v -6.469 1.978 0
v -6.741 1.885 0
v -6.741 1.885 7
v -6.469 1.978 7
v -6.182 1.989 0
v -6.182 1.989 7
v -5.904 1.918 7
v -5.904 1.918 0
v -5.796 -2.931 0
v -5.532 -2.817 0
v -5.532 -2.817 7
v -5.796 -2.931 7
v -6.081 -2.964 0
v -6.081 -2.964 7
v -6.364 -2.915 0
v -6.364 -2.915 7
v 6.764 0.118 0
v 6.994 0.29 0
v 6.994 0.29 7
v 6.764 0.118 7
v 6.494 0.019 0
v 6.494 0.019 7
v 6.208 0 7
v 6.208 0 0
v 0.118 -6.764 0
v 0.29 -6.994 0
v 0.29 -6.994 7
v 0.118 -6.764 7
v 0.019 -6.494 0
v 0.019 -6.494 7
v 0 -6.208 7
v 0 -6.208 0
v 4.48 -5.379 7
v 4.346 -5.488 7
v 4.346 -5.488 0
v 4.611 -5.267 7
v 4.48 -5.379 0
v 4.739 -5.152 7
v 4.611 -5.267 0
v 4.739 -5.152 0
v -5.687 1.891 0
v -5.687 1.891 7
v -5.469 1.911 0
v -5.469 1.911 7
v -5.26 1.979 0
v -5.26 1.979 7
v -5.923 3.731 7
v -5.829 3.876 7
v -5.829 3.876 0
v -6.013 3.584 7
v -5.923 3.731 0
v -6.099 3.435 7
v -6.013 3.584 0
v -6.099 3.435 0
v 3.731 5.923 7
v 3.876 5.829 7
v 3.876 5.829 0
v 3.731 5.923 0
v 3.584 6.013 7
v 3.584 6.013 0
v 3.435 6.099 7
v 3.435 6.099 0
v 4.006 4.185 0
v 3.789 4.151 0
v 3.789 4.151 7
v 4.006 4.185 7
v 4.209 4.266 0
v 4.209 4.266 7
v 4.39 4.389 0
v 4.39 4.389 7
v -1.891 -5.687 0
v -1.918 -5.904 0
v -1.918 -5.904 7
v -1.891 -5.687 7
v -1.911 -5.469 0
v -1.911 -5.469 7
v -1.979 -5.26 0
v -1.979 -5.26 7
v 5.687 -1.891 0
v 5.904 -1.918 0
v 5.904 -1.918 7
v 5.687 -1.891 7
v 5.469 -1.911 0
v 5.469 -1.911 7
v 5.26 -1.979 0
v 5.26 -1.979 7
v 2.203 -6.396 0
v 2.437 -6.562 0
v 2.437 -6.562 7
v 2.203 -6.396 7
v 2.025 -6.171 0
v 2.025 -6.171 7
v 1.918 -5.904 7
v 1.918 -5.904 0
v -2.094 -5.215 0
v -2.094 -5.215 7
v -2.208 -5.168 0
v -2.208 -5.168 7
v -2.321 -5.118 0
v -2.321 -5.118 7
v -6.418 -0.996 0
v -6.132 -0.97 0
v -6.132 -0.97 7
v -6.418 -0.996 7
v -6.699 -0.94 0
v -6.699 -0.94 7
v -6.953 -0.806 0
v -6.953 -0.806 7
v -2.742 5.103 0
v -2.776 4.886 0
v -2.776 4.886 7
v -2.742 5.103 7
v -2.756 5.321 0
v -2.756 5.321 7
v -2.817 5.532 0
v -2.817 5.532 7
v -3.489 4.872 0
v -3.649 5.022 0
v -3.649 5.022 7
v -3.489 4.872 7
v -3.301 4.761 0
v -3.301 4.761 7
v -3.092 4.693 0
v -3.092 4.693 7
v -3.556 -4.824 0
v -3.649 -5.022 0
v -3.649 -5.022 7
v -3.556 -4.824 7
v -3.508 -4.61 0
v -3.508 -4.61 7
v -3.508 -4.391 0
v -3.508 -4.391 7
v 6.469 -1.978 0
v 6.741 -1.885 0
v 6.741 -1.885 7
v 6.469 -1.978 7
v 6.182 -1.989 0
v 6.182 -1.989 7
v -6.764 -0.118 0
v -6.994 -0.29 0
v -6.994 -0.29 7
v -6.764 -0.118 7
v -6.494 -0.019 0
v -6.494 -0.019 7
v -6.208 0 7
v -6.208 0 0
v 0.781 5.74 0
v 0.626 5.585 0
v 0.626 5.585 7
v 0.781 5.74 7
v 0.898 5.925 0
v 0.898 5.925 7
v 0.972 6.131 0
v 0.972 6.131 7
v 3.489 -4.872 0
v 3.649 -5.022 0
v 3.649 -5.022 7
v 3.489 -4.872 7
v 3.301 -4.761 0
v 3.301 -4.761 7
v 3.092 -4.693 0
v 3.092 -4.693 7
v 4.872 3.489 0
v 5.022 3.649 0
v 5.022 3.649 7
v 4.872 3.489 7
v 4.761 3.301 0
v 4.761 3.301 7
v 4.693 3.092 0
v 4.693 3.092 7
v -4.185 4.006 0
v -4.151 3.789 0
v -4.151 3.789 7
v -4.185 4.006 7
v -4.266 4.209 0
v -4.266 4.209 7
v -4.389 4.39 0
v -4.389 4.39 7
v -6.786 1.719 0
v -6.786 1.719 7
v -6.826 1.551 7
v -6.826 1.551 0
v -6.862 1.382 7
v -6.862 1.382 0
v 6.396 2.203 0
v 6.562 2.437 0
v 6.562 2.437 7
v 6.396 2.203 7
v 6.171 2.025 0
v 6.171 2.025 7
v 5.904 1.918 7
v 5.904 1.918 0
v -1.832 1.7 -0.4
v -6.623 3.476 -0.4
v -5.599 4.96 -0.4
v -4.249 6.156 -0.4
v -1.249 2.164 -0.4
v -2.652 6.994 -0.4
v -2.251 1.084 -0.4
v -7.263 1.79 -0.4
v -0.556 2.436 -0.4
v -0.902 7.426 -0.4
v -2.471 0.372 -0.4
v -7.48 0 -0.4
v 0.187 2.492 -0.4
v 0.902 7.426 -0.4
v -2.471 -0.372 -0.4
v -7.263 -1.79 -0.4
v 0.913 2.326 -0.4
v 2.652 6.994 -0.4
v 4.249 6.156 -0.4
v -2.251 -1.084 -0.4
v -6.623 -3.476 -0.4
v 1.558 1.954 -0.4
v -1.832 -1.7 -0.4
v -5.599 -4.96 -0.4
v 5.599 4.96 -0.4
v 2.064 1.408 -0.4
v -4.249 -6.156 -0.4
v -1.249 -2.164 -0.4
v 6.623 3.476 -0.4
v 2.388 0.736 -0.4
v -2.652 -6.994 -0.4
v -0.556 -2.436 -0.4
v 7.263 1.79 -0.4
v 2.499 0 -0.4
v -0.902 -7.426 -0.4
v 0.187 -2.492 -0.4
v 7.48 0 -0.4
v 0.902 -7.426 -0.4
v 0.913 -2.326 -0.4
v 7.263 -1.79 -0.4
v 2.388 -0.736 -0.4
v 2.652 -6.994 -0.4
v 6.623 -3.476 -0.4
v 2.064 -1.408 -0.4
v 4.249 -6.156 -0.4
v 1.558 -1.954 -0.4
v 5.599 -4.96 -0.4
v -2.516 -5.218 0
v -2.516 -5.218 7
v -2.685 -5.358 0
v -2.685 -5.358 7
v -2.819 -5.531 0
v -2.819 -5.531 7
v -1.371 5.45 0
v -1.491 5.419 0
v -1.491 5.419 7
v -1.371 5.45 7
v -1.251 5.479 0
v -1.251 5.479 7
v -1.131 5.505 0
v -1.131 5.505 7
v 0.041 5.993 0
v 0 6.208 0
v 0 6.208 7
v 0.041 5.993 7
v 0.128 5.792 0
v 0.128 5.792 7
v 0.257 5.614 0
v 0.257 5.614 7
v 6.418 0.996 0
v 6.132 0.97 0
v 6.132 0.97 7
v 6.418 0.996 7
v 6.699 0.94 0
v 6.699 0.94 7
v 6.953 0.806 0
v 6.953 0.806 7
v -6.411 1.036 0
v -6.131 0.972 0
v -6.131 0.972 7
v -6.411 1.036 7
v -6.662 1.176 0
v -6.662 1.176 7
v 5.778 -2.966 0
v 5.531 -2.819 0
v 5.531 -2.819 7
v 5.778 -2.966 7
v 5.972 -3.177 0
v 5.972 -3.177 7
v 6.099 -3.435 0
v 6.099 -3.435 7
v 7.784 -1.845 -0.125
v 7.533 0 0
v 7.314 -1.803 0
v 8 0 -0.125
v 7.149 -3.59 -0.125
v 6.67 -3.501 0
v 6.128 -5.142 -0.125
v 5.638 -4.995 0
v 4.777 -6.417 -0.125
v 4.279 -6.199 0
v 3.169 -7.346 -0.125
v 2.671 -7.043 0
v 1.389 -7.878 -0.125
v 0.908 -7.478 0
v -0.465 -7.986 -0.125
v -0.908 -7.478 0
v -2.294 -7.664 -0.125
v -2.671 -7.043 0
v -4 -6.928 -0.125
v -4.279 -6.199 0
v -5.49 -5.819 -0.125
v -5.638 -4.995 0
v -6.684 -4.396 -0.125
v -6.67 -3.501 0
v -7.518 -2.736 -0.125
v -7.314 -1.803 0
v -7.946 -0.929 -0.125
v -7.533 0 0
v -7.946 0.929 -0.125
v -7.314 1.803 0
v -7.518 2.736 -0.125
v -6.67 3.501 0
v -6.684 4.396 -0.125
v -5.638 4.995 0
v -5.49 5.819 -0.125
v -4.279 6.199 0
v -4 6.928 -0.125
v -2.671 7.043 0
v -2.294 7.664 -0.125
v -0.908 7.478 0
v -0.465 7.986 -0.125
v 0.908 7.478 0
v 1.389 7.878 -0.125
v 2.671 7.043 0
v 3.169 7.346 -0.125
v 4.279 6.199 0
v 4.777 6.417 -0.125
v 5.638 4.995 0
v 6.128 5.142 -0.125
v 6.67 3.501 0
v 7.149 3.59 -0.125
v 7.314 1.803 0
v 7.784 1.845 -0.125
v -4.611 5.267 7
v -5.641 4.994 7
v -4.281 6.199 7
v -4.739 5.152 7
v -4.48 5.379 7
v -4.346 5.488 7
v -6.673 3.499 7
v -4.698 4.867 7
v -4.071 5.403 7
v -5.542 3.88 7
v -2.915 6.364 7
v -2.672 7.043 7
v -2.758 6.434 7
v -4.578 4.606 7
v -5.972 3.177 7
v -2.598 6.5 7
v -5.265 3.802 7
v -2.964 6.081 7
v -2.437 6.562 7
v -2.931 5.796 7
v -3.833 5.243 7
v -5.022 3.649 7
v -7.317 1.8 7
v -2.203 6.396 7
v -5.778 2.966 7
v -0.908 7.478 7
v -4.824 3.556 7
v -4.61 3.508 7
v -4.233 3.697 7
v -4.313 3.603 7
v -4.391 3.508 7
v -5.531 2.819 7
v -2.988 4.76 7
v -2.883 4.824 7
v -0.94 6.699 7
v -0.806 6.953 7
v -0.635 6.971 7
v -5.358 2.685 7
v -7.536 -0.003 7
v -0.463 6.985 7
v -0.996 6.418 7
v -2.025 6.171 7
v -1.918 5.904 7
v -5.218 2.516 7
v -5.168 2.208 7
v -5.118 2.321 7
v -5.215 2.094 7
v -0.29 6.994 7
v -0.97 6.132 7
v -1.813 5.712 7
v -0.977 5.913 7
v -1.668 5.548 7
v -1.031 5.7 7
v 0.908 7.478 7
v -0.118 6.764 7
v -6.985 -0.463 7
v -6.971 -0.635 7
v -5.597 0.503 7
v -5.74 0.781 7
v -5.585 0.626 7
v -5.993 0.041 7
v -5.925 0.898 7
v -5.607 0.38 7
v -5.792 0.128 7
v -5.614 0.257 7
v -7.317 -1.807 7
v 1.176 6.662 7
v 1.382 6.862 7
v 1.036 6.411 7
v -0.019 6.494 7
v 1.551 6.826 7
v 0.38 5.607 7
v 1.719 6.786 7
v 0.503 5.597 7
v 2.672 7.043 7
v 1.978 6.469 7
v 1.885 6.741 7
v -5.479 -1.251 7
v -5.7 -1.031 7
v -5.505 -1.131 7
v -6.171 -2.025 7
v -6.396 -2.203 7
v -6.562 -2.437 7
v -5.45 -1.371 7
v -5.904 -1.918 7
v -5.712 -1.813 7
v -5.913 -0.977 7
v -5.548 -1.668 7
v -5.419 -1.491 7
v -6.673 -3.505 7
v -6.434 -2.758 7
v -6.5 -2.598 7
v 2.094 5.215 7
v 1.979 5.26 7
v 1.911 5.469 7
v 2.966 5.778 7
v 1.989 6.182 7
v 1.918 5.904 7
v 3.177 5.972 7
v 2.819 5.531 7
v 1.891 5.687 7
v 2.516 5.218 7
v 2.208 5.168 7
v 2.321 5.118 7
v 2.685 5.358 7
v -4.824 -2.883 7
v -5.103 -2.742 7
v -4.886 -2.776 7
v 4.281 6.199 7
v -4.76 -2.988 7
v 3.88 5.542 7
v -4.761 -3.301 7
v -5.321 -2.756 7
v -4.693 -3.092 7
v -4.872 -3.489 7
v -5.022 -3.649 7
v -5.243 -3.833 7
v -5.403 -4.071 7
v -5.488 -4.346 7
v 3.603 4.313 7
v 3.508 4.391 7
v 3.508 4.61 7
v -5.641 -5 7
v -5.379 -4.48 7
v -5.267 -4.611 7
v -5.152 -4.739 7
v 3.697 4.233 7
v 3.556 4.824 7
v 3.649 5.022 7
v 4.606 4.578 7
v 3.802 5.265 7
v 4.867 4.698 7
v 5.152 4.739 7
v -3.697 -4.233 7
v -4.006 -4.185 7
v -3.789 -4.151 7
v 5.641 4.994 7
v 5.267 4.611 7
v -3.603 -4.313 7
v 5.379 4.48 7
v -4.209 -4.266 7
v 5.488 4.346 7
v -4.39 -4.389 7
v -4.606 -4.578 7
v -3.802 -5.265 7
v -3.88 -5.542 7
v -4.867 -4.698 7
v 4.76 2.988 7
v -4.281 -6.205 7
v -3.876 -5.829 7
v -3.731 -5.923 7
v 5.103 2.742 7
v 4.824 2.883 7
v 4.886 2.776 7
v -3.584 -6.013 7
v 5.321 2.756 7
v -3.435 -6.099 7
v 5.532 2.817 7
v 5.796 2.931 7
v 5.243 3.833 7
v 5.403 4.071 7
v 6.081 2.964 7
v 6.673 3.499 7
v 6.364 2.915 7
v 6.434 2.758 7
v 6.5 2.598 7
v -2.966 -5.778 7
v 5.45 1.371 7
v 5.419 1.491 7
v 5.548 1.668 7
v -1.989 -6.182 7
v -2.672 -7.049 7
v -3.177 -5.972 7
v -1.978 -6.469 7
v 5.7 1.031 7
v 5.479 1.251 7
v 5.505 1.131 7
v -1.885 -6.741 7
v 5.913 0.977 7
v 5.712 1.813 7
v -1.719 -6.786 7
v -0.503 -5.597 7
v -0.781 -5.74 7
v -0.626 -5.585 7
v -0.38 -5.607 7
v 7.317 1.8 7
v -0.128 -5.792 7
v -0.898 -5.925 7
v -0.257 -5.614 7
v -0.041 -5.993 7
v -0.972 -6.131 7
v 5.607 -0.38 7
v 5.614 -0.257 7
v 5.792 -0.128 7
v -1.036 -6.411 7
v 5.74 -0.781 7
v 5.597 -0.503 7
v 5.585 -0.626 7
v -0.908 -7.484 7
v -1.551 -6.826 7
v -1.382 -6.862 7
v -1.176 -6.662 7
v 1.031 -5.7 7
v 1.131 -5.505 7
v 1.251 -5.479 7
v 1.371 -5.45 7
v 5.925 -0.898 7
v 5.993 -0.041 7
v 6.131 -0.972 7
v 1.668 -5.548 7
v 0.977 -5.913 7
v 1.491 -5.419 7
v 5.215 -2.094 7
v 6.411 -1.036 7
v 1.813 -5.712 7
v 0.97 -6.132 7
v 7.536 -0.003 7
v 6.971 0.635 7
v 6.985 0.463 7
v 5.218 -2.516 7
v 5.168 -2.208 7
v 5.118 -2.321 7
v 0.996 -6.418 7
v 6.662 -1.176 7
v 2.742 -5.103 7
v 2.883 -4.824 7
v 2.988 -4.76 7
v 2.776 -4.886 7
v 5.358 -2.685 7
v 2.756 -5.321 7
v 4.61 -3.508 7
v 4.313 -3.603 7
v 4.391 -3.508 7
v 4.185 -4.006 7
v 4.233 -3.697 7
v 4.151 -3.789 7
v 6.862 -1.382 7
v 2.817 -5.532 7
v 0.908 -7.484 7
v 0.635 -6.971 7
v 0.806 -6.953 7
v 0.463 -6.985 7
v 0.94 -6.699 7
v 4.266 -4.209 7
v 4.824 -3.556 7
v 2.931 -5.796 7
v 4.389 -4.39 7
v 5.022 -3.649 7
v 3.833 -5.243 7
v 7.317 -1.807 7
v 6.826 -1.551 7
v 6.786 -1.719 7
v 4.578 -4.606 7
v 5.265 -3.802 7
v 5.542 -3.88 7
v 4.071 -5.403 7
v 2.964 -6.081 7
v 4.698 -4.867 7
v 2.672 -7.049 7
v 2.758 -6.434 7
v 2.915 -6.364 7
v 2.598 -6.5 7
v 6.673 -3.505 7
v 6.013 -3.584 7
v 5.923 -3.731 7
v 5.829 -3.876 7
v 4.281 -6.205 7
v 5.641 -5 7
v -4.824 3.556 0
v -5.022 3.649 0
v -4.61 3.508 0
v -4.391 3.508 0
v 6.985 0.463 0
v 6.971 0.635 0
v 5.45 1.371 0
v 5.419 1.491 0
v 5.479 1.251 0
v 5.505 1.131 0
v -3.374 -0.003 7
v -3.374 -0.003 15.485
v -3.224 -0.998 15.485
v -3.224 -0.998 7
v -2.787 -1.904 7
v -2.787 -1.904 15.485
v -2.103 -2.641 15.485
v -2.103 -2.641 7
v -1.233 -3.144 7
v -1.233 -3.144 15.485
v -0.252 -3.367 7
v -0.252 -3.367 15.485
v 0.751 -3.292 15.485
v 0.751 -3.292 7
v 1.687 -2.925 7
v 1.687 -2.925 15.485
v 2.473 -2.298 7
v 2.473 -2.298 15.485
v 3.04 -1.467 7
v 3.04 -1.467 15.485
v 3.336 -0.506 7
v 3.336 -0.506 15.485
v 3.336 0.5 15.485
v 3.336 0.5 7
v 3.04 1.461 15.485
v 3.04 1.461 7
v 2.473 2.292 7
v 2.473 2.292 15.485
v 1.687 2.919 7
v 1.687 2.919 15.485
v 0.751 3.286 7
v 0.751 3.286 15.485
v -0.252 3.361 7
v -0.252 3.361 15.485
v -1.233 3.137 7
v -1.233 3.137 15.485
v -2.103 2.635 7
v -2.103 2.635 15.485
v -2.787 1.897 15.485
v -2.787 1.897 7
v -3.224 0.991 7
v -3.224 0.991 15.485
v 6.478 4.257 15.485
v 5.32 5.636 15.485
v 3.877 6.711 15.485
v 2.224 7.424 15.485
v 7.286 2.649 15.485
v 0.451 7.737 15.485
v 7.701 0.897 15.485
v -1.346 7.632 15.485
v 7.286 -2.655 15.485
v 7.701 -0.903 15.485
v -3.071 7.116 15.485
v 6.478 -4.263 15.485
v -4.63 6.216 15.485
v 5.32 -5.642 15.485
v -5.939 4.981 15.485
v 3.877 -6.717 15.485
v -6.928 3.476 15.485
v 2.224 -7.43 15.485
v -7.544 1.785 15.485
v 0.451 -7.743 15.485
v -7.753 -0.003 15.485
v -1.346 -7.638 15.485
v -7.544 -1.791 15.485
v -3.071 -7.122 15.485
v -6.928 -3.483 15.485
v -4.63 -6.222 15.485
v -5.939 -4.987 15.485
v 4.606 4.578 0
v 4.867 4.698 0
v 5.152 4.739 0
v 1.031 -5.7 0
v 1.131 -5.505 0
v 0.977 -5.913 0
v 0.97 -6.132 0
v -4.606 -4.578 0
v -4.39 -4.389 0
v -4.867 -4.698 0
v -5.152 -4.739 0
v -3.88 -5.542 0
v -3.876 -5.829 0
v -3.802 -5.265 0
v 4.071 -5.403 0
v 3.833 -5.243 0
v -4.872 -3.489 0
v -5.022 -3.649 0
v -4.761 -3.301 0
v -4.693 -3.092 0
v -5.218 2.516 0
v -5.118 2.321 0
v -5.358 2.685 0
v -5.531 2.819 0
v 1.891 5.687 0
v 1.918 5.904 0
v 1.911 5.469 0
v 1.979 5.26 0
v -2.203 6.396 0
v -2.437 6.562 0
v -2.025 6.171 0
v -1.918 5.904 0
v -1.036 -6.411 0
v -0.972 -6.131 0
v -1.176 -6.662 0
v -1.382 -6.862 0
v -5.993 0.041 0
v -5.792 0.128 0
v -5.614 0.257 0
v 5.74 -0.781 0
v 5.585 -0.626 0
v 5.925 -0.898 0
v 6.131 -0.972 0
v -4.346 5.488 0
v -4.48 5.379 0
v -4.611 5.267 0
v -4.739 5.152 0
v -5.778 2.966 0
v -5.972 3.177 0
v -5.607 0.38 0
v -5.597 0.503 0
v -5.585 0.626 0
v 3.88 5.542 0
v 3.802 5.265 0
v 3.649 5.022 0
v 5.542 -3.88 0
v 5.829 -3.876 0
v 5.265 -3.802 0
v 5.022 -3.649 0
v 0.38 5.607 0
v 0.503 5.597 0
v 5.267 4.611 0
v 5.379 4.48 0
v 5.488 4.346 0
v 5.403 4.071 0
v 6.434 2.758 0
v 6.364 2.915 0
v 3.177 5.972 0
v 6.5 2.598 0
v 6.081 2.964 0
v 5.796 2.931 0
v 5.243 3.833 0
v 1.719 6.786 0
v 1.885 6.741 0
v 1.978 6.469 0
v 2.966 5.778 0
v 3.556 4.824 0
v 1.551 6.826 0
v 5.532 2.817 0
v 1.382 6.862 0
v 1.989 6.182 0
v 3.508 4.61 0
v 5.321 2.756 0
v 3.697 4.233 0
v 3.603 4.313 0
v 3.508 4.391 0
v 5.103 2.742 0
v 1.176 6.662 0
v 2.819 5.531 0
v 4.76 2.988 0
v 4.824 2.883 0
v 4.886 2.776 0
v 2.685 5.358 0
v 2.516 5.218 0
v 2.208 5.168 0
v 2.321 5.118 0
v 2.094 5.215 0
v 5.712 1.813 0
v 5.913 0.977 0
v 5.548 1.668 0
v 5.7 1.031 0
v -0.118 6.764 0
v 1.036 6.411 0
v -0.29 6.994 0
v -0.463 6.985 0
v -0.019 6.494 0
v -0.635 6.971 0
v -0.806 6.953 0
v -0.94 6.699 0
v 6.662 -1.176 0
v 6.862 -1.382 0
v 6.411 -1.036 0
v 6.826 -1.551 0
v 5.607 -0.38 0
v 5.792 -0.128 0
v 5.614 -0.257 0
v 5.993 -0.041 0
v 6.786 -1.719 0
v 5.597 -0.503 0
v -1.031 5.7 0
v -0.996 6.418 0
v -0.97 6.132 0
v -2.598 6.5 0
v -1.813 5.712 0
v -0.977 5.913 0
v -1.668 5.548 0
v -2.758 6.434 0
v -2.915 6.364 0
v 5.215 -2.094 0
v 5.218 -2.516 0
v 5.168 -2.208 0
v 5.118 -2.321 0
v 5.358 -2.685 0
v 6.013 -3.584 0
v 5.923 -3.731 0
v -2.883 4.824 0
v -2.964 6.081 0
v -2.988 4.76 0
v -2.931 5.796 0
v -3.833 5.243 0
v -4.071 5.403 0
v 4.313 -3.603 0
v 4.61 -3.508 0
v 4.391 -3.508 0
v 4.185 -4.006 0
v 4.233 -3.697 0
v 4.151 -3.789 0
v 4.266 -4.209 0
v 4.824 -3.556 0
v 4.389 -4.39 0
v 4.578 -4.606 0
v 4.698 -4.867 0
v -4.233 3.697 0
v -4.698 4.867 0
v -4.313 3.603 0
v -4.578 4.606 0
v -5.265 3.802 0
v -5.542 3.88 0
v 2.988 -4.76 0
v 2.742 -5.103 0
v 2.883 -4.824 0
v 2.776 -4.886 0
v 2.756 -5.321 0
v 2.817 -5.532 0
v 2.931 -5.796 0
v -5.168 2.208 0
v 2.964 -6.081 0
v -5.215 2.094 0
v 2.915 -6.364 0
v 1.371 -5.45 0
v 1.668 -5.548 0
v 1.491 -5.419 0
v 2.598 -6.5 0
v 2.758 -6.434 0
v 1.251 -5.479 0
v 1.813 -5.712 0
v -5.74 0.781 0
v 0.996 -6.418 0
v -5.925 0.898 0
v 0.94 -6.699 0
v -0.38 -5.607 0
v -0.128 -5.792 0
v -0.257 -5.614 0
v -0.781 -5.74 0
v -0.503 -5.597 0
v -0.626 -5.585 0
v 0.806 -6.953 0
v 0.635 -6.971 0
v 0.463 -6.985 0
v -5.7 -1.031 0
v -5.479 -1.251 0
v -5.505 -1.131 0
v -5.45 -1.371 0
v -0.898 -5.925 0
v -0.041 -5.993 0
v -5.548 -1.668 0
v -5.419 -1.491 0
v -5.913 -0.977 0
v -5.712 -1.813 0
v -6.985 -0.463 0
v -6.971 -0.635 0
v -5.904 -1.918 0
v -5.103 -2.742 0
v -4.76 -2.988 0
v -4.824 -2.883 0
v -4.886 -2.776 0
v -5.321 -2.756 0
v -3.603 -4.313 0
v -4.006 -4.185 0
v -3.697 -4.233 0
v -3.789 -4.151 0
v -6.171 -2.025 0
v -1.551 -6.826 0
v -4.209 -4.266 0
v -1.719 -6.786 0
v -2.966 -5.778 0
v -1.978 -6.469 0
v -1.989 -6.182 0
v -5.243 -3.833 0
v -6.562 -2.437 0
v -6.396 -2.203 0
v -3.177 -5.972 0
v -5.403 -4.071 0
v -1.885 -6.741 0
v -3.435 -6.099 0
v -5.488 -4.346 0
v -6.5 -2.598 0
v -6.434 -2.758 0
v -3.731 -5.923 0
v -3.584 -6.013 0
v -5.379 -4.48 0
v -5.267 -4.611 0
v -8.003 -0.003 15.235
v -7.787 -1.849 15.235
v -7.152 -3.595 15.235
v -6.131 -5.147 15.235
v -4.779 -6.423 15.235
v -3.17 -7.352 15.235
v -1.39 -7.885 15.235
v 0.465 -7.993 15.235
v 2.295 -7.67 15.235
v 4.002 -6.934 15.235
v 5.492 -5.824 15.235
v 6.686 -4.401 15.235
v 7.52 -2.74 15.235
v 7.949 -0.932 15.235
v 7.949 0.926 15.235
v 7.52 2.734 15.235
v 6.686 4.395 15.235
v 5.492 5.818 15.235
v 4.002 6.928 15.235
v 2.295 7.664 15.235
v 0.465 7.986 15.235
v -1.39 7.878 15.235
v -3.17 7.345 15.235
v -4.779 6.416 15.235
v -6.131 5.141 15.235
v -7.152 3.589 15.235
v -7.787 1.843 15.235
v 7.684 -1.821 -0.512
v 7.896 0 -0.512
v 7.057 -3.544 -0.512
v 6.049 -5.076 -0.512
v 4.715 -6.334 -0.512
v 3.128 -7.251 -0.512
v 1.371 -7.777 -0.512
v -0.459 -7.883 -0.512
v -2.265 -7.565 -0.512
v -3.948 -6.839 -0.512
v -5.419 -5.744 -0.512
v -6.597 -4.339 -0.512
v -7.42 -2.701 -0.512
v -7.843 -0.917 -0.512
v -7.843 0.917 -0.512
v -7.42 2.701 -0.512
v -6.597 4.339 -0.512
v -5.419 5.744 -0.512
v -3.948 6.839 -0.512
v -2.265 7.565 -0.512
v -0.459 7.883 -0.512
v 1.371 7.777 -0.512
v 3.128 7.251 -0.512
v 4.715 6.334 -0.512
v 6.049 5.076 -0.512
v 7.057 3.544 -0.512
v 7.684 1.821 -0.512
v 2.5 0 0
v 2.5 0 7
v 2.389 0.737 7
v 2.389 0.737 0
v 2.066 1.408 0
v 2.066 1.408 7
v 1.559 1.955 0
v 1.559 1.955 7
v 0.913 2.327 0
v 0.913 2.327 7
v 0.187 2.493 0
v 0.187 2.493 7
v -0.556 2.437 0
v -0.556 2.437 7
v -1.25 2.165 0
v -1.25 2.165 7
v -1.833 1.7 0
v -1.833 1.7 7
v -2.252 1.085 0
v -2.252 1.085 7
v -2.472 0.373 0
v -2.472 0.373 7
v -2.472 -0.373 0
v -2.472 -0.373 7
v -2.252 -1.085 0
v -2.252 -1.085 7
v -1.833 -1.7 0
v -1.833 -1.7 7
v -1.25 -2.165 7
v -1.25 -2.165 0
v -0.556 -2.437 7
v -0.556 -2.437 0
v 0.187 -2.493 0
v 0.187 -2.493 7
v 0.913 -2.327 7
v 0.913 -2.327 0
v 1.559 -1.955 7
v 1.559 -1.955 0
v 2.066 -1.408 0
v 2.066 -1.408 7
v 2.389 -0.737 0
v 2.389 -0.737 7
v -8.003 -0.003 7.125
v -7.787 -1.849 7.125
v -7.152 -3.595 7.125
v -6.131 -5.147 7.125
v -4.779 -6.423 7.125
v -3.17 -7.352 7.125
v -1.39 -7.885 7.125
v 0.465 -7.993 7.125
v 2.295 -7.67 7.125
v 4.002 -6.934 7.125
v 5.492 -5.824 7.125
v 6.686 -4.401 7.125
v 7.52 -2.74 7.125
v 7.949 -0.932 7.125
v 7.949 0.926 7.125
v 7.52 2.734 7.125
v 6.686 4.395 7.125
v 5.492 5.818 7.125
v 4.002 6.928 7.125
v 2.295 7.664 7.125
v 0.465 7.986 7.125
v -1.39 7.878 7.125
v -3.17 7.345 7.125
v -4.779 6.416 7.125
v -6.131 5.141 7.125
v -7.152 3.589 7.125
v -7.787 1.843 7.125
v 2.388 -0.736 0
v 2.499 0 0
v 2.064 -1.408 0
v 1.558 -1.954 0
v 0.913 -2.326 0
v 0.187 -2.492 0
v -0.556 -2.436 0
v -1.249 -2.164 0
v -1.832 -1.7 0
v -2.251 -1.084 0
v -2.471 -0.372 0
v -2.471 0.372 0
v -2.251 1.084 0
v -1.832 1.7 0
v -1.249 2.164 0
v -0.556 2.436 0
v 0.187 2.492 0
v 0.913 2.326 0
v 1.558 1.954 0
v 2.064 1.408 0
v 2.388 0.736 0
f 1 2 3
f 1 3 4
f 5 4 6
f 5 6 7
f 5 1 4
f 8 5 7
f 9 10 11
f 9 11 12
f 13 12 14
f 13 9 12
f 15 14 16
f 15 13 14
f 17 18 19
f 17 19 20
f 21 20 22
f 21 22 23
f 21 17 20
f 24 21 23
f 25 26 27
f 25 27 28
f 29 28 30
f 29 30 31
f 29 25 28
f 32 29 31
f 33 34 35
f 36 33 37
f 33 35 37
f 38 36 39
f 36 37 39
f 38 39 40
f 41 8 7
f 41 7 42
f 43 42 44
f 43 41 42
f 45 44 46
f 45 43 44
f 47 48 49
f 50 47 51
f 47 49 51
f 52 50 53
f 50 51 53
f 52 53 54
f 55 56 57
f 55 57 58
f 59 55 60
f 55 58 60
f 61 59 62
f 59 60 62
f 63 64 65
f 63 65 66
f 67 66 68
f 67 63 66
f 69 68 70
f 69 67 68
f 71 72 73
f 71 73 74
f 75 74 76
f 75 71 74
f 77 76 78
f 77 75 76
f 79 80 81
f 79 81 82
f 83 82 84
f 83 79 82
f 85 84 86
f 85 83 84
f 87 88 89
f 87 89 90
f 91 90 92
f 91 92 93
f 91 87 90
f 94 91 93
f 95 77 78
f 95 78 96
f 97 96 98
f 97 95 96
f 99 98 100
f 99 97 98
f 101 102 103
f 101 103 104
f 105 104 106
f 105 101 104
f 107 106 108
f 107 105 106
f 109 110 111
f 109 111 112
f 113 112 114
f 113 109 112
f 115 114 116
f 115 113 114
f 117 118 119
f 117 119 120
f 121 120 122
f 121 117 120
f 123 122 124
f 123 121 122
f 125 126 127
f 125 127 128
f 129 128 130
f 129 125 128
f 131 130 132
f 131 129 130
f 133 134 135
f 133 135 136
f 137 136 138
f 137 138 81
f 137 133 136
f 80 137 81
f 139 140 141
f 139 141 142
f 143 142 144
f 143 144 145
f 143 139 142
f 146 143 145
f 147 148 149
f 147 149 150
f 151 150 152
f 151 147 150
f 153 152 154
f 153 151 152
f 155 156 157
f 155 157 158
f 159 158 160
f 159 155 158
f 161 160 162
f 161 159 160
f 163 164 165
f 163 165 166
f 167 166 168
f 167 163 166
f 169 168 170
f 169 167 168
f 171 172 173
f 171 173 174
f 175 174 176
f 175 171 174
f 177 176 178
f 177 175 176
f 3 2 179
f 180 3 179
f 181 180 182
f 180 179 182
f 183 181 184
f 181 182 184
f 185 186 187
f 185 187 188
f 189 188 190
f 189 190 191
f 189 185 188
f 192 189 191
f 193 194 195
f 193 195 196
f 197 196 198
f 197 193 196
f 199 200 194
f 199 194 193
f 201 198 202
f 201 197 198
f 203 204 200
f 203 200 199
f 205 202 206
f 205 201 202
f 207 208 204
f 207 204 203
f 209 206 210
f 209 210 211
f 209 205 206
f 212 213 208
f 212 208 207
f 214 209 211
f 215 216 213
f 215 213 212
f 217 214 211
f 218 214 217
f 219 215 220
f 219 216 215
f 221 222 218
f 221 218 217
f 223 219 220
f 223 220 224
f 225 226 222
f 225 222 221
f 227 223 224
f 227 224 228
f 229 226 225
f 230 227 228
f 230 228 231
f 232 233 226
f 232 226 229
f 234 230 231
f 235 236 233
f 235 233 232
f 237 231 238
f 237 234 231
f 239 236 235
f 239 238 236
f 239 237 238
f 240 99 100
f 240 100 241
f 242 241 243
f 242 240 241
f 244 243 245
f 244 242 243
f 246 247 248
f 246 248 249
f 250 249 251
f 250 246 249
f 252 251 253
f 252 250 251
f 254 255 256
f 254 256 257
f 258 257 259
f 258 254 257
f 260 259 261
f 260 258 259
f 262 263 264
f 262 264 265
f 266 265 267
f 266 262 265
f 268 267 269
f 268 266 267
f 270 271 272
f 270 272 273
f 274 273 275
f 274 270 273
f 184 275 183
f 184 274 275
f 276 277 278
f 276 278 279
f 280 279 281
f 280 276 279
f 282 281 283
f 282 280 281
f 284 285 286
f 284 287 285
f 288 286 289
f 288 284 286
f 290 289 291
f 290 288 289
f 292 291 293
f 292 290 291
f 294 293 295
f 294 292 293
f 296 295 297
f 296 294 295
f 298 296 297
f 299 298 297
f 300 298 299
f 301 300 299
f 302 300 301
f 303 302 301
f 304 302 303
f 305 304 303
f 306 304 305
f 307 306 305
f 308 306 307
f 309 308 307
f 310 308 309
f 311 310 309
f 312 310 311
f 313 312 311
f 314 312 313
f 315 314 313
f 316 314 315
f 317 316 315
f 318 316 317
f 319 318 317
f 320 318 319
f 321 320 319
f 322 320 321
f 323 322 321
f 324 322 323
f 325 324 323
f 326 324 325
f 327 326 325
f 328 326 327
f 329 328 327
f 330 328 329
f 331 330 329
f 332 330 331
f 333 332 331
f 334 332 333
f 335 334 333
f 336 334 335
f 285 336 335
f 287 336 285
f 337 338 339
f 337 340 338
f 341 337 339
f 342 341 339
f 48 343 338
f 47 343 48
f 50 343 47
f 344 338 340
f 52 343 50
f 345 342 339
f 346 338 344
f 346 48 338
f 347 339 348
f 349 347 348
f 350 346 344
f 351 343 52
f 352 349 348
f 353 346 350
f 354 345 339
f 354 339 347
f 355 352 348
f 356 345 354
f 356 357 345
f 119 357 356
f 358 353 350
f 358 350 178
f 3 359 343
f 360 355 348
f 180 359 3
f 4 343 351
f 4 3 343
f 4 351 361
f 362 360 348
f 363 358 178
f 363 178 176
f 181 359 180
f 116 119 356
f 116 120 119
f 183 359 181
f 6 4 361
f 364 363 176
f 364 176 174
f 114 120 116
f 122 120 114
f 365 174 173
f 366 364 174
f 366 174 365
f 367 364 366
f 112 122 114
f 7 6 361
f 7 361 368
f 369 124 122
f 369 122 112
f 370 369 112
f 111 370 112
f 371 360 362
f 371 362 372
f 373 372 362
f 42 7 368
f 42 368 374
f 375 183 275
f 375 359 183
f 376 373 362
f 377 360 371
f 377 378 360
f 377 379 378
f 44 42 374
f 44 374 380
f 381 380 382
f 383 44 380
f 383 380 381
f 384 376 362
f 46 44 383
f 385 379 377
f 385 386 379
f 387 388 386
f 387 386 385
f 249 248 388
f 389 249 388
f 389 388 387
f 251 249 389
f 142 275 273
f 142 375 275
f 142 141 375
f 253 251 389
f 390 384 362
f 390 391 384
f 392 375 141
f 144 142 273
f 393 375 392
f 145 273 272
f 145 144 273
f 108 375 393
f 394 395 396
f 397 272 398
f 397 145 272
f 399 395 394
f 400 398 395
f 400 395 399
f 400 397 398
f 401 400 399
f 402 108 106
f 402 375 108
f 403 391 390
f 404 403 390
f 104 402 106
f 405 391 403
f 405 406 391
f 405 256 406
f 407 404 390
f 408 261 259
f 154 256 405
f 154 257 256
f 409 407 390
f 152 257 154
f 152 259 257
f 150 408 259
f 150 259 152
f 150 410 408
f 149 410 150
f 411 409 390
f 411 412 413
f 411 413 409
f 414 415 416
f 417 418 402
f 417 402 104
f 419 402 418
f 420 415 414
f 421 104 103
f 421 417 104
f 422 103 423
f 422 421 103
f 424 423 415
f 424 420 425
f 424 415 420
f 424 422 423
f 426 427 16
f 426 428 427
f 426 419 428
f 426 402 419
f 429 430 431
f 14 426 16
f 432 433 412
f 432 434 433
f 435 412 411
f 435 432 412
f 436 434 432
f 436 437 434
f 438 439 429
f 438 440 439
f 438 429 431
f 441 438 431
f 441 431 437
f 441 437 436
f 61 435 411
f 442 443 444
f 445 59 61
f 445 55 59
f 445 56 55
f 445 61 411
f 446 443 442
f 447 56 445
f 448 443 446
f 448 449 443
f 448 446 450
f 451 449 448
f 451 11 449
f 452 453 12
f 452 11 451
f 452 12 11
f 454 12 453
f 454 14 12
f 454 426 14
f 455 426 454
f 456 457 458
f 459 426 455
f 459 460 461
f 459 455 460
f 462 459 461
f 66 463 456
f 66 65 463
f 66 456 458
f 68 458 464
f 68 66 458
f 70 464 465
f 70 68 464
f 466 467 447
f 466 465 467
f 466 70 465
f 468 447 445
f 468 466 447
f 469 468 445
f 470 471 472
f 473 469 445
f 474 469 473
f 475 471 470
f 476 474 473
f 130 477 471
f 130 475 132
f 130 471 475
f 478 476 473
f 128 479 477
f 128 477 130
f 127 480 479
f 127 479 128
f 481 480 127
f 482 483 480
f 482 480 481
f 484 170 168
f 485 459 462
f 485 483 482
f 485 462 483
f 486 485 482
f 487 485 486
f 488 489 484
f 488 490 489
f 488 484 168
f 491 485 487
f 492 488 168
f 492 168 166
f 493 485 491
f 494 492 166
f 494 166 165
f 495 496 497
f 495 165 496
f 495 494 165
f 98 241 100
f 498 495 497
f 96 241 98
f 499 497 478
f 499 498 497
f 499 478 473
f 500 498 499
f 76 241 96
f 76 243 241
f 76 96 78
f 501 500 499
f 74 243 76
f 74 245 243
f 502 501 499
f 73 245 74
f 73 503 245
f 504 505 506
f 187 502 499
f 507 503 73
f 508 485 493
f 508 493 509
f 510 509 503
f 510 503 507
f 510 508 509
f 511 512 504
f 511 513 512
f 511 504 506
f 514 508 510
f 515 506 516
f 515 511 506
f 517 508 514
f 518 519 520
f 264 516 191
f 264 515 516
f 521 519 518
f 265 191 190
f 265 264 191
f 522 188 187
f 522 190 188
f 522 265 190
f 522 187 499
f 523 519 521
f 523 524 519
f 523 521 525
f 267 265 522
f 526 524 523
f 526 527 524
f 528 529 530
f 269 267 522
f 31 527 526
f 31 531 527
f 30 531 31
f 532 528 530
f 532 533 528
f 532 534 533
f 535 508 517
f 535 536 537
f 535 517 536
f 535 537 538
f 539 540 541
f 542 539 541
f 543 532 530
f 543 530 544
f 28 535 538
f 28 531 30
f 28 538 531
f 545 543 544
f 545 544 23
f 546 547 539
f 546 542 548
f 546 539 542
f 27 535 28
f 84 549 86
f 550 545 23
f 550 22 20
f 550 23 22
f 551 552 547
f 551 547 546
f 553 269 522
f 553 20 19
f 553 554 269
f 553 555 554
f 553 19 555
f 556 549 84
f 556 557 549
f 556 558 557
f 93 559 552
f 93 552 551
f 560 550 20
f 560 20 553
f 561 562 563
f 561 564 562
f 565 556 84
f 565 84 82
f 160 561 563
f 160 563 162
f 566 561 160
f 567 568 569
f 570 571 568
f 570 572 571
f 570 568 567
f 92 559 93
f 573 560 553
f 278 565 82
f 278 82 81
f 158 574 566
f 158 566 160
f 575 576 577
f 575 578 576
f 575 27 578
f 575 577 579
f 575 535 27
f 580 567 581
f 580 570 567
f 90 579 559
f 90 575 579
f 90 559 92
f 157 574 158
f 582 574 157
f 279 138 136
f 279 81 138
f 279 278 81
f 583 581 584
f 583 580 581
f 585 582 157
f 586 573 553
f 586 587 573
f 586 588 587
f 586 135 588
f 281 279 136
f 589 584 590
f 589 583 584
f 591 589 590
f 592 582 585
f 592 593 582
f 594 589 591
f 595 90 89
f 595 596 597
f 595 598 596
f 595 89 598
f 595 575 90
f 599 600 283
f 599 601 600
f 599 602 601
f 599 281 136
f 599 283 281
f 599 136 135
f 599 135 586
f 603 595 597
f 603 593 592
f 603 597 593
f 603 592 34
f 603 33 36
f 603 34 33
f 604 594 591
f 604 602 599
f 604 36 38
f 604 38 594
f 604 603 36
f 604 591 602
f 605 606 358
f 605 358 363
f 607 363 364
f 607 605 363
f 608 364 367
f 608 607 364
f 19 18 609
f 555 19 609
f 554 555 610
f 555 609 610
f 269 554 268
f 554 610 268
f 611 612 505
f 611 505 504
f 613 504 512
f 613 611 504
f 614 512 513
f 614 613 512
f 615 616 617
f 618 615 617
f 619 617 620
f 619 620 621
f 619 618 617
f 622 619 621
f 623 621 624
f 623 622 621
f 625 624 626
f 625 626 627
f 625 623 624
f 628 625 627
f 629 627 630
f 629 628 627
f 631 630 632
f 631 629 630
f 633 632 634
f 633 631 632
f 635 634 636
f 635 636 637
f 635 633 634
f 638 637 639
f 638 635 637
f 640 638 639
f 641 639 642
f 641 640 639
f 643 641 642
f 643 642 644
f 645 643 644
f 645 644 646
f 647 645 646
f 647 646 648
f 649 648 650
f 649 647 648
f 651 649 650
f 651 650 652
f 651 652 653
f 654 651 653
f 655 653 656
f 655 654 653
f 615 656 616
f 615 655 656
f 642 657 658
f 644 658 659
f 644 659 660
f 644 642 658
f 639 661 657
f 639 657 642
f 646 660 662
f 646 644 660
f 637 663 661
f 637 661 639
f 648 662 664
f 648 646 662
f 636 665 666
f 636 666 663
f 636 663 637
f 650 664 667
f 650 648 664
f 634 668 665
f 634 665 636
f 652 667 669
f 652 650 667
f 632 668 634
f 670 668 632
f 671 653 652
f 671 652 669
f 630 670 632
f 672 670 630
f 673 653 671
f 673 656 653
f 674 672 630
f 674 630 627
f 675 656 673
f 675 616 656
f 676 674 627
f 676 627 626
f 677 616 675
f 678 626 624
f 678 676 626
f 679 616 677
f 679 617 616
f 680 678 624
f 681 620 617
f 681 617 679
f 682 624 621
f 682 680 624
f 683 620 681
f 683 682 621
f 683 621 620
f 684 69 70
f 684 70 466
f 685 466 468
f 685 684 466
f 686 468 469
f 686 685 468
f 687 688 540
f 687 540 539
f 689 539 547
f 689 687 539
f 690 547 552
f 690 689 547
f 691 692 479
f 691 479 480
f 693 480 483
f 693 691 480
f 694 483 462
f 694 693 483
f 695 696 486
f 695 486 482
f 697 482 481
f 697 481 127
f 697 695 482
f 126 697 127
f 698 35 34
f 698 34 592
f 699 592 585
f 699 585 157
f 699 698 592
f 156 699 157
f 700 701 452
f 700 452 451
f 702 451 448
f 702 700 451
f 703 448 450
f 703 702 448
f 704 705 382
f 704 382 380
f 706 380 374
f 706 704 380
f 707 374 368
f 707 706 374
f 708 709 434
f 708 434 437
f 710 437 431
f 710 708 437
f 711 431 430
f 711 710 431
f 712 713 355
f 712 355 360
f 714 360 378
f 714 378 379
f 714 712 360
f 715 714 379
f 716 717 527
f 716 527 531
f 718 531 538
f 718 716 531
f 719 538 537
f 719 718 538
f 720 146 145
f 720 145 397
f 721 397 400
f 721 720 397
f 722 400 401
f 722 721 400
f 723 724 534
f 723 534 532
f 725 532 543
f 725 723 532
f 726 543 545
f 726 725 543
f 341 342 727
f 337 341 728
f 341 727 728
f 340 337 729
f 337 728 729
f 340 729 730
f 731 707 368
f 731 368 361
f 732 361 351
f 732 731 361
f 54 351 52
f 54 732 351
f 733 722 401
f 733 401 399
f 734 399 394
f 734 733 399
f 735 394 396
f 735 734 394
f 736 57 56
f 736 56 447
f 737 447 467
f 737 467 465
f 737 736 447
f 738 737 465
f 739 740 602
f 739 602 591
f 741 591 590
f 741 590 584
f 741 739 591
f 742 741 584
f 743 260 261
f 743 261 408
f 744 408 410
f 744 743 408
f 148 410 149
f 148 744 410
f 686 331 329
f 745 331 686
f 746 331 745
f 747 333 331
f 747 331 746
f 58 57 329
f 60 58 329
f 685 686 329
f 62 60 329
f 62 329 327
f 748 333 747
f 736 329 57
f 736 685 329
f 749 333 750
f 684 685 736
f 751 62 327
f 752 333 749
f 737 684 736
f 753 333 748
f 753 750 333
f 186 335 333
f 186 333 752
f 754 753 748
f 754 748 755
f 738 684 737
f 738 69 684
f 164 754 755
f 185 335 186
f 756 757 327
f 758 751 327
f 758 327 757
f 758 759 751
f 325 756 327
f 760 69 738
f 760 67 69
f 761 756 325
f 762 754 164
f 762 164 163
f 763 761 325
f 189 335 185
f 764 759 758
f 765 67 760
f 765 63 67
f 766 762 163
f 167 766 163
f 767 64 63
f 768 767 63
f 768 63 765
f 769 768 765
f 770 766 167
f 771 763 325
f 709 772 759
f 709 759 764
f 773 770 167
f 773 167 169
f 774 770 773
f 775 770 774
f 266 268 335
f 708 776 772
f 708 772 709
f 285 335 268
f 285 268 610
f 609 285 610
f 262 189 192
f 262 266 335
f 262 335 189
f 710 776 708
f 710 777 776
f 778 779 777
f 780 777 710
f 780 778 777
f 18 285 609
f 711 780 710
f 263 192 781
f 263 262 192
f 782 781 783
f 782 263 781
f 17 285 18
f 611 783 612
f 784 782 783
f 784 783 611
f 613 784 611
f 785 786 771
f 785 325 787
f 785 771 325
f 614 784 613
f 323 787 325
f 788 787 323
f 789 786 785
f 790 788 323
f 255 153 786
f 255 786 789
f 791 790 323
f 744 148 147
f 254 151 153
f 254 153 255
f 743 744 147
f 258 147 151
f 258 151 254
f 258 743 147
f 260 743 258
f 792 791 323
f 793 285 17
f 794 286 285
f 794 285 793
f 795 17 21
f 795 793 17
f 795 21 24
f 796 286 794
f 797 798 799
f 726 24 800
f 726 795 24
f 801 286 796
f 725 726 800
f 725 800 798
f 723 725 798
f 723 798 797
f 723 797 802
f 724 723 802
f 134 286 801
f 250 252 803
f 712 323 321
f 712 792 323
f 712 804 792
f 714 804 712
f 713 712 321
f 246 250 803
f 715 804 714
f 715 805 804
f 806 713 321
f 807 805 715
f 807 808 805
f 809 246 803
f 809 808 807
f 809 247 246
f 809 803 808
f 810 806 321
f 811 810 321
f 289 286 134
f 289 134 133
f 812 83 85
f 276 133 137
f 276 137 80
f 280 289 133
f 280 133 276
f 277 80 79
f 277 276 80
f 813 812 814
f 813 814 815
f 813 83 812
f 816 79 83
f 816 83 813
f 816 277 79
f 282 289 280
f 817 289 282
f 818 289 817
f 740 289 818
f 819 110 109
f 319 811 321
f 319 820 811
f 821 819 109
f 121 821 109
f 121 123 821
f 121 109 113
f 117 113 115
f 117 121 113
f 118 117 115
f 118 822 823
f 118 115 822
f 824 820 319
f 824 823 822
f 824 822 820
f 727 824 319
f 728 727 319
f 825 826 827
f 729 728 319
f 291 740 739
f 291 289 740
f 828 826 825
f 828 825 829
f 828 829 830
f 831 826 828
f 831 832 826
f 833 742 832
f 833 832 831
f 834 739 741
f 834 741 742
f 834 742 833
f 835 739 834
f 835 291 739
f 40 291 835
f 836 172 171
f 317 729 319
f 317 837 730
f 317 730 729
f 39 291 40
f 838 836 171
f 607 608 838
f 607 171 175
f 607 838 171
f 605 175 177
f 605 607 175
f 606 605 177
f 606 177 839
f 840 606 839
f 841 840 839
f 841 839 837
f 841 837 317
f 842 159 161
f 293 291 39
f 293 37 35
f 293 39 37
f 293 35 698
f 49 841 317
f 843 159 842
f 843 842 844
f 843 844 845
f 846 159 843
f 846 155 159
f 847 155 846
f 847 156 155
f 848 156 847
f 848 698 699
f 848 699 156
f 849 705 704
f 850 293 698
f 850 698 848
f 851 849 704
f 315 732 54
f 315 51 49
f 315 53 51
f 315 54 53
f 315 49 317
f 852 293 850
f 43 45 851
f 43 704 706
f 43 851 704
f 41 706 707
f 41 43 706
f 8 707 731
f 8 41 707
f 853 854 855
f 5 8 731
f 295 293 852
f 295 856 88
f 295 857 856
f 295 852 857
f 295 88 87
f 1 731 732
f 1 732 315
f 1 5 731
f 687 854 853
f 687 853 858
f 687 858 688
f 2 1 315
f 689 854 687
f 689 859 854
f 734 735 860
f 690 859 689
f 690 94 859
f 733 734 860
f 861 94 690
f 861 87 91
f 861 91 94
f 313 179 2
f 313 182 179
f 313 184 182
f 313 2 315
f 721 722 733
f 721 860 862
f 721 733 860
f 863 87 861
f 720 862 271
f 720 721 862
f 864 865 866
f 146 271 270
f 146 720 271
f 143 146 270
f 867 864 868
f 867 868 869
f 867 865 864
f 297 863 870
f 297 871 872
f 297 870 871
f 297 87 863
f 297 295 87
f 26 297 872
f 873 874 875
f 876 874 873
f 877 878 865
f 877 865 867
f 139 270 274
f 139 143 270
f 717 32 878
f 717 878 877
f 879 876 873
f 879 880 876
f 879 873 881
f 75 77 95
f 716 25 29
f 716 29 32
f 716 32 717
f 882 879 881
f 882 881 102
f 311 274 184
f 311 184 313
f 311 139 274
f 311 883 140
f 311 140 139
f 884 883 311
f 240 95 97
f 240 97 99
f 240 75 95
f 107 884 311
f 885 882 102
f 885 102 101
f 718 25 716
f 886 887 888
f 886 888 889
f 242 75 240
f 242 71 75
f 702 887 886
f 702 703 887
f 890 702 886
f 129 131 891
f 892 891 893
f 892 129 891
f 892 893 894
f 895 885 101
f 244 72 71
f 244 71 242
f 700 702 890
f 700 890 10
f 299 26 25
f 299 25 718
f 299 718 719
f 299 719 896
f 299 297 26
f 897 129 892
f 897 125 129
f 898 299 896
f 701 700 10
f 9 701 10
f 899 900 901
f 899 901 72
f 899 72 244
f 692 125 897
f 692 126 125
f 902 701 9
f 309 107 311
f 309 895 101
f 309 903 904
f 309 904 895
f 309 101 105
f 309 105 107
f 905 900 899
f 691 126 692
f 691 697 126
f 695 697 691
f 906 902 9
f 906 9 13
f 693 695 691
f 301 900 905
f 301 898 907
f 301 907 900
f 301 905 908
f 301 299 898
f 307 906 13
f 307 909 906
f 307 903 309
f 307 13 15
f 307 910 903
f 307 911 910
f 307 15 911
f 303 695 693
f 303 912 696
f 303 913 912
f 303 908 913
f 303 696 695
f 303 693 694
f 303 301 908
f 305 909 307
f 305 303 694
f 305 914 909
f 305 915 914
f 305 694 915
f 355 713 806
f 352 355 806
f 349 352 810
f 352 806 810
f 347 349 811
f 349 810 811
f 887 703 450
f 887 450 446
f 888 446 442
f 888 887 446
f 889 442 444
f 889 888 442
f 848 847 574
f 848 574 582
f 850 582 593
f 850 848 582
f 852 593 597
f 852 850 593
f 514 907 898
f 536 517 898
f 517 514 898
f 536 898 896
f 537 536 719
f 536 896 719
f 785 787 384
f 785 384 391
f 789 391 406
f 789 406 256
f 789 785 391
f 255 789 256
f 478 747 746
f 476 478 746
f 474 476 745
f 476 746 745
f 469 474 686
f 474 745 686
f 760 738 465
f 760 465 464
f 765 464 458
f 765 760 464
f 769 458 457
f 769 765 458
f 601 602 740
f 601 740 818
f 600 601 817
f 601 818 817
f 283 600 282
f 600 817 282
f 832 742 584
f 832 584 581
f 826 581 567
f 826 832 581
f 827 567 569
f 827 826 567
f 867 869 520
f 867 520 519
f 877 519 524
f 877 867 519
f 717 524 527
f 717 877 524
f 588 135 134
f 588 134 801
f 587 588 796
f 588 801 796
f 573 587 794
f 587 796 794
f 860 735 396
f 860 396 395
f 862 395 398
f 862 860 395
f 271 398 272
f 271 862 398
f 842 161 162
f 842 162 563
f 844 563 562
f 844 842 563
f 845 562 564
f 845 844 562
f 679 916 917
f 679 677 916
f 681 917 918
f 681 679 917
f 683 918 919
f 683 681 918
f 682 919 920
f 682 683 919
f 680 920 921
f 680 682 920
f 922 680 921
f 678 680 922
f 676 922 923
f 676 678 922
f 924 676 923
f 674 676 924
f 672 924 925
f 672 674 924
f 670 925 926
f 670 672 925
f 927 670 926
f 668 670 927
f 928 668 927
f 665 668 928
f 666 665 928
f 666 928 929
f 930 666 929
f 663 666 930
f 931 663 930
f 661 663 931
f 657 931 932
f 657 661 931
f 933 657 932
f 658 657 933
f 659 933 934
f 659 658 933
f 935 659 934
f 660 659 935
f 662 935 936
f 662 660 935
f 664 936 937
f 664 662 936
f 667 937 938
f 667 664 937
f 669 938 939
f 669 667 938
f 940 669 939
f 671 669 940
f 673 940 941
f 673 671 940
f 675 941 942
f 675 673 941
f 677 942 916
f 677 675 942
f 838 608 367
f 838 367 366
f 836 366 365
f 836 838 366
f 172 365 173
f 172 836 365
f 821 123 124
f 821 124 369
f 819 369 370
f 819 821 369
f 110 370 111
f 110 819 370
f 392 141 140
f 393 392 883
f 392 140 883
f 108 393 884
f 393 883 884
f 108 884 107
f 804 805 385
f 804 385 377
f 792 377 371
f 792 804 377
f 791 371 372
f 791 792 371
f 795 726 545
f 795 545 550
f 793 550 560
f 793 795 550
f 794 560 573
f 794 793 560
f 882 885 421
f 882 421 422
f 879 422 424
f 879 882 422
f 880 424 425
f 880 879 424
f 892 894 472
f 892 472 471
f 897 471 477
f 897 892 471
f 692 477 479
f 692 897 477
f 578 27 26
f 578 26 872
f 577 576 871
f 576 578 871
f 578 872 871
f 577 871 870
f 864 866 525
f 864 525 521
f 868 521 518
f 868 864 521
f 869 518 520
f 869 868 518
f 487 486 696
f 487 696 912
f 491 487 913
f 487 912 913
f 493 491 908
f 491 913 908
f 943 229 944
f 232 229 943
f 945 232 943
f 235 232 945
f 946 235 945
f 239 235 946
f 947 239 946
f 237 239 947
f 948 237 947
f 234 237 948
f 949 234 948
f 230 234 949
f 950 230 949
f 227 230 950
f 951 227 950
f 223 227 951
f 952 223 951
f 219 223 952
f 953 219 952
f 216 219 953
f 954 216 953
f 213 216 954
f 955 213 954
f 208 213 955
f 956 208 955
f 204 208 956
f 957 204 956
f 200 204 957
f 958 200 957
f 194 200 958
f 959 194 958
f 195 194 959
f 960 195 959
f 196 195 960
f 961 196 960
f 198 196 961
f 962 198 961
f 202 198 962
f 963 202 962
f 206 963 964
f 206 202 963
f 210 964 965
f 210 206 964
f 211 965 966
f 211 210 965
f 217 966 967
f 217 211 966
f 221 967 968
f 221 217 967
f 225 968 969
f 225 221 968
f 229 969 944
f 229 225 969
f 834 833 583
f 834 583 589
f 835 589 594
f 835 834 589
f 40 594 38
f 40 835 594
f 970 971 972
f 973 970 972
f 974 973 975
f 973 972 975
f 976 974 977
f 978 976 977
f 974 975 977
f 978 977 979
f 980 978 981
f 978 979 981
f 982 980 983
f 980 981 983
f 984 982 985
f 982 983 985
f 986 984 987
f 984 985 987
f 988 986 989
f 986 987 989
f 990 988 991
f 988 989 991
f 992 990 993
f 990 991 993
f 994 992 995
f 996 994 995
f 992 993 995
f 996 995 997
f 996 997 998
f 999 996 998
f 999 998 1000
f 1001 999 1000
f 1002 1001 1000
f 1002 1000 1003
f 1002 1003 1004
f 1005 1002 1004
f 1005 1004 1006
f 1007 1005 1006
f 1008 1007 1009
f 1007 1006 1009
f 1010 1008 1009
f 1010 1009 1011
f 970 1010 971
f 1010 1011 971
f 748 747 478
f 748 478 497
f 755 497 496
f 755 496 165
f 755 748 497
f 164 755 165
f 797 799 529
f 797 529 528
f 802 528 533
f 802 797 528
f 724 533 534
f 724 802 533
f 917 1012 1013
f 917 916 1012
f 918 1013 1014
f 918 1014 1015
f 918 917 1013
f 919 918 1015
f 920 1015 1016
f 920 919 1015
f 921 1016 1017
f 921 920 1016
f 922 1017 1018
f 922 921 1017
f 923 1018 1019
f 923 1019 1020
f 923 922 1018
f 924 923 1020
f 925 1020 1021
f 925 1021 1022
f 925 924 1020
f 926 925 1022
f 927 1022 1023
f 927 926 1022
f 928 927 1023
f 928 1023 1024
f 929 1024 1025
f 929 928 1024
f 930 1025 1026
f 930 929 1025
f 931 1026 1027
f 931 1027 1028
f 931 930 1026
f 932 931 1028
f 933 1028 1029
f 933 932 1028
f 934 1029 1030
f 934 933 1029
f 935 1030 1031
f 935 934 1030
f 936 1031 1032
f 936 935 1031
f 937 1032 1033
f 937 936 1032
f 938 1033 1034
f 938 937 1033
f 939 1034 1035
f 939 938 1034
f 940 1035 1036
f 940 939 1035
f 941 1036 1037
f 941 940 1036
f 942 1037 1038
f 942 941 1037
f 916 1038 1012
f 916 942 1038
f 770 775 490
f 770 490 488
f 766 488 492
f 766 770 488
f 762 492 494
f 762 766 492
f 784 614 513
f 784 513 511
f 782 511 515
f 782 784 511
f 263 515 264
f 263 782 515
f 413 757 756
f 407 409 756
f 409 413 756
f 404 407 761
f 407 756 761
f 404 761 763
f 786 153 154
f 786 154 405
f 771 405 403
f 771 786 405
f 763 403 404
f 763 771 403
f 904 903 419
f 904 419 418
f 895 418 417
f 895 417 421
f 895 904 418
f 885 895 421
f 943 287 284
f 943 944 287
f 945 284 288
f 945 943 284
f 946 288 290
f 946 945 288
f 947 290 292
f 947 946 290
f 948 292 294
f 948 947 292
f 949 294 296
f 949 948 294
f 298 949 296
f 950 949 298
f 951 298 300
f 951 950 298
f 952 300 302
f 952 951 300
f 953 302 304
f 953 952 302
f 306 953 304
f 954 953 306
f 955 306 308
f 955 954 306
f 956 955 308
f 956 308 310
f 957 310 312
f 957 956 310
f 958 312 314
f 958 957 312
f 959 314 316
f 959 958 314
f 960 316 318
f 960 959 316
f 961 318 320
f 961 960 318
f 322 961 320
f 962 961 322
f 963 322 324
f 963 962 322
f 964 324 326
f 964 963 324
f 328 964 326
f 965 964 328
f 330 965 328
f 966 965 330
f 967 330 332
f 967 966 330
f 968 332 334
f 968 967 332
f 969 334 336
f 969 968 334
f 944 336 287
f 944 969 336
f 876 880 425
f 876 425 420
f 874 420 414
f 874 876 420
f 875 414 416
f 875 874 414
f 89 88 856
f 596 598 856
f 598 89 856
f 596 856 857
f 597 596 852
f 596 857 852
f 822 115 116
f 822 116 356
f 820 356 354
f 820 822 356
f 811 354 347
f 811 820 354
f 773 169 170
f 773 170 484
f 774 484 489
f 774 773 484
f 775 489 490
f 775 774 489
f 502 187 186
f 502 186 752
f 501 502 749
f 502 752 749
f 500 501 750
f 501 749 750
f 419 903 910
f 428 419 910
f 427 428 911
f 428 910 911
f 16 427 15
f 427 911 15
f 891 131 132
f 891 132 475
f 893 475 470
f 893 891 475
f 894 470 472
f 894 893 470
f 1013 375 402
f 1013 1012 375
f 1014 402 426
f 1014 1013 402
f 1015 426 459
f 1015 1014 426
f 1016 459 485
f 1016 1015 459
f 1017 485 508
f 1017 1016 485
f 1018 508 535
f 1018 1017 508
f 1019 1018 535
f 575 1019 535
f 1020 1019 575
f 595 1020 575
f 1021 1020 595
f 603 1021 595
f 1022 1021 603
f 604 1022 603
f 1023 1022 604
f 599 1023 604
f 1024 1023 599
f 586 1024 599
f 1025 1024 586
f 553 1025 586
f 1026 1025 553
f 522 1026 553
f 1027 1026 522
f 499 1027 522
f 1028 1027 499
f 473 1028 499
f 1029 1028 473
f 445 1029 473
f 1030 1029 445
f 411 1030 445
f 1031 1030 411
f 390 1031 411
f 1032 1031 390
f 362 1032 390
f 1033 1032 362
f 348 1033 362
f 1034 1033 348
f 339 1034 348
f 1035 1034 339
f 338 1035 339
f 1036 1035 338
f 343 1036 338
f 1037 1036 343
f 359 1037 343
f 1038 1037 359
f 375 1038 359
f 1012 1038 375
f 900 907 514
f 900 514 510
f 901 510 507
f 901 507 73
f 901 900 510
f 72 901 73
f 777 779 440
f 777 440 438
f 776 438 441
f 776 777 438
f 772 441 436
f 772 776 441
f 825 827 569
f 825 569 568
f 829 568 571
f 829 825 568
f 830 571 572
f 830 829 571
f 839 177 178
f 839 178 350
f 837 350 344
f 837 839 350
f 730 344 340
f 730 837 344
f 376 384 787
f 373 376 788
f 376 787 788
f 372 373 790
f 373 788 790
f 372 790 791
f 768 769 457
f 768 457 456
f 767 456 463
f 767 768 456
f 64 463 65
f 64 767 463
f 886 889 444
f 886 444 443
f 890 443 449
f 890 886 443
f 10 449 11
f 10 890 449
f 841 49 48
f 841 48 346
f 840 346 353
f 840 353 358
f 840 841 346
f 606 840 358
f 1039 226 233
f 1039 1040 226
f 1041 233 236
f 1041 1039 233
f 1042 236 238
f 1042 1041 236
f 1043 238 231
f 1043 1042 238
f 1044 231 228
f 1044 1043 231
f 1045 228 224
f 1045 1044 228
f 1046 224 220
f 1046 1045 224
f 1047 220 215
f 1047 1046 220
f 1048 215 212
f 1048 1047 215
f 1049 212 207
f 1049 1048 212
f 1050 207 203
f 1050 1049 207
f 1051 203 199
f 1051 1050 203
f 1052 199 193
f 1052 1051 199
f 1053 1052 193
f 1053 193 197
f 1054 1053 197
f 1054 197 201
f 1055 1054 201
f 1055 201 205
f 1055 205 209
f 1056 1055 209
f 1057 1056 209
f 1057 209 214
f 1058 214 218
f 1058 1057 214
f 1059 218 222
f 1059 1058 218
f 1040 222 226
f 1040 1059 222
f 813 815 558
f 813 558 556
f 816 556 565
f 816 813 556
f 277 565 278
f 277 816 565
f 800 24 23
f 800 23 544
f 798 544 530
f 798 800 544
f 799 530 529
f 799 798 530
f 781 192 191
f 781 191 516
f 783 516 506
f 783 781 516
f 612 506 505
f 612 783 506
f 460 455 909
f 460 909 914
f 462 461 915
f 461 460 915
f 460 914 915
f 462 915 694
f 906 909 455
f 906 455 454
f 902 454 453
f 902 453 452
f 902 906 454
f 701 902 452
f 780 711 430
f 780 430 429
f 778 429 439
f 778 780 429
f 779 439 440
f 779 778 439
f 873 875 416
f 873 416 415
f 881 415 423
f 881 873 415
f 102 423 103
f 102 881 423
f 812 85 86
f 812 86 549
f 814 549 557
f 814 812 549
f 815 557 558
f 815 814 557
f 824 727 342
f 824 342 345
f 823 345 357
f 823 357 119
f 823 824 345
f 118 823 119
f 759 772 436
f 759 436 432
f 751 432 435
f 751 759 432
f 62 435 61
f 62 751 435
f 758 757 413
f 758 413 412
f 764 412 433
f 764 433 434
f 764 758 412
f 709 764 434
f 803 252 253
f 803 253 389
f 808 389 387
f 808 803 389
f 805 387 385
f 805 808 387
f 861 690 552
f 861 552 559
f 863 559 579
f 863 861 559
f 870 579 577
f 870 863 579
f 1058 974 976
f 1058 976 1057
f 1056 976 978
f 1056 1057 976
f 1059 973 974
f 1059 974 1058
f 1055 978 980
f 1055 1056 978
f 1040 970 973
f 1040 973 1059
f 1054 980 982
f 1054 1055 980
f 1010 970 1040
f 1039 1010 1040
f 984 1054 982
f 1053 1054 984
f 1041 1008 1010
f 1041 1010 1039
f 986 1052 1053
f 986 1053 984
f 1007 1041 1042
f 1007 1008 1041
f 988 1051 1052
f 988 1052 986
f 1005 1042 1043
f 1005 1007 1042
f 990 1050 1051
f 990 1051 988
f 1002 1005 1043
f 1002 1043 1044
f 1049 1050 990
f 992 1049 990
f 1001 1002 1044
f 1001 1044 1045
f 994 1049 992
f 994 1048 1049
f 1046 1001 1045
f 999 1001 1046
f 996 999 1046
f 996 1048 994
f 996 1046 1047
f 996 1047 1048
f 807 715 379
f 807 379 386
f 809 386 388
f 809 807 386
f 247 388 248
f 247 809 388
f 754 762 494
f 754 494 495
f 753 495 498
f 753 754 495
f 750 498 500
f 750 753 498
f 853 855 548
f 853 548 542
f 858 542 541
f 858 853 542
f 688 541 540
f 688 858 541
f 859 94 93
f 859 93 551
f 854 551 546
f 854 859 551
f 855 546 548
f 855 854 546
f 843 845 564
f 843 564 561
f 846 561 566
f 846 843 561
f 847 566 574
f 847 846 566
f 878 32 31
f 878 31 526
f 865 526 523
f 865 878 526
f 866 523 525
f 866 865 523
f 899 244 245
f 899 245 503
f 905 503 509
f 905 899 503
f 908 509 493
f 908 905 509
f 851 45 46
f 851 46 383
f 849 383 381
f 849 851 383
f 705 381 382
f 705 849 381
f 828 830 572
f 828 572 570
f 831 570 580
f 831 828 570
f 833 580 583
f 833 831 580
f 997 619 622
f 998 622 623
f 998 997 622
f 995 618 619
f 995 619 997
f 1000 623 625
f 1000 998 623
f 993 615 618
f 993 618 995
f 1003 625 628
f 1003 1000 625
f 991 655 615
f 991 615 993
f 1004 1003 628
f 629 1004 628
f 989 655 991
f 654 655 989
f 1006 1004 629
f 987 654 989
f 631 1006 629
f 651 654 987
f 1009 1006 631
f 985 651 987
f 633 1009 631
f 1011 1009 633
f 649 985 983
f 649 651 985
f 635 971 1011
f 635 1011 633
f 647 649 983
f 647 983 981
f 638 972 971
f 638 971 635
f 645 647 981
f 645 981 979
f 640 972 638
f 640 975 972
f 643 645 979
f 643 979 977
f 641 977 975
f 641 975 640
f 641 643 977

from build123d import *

# Parameters (mm, degrees)
SKETCH1_R           = 7
BOSS_EXTRUDE1_DEPTH = 7
CUT_EXTRUDE1_START  = -7
CUT_EXTRUDE1_DEPTH  = 7
CIRPATTERN1_COUNT   = 20
SKETCH3_R           = 2.5
CUT_EXTRUDE2_DEPTH  = 7


with BuildPart() as part:
    # Sketch1 → Boss-Extrude1 (new body)
    with BuildSketch(Plane.XY):
        Circle(SKETCH1_R)
    extrude(amount=BOSS_EXTRUDE1_DEPTH)

    # Sketch2 → Cut-Extrude1 (cut)
    with BuildSketch(Plane.XY.offset(7).offset(CUT_EXTRUDE1_START)):
        with BuildLine():
            ThreePointArc((0.972302791, 6.1312752), (1.096934983, 6.541731598), (1.382072919, 6.862206238))
            ThreePointArc((1.382072919, 6.862206238), (0.549882168, 6.978368692), (-0.290231769, 6.993980663))
            ThreePointArc((-0.290231769, 6.993980663), (-0.058806828, 6.632801852), (0, 6.207890809))
            ThreePointArc((0, 6.207890809), (0.07898528, 5.889690377), (0.256638442, 5.614137219))
            ThreePointArc((0.256638442, 5.614137219), (0.441476826, 5.60263315), (0.62583581, 5.585045169))
            ThreePointArc((0.62583581, 5.585045169), (0.844454593, 5.829372853), (0.972302791, 6.1312752))
        make_face()
    cut_extrude1 = extrude(amount=CUT_EXTRUDE1_DEPTH, mode=Mode.SUBTRACT)

    # CirPattern1: Cut-Extrude1 ×20 about axis
    cirpattern1_axis = Axis((0, 0, 0), (0, 0, 1))
    for i in range(1, CIRPATTERN1_COUNT):
        add(cut_extrude1.rotate(cirpattern1_axis, i * 360 / CIRPATTERN1_COUNT), mode=Mode.SUBTRACT)

    # Sketch3 → Cut-Extrude2 (cut)
    with BuildSketch(Plane.XY.offset(7)):
        Circle(SKETCH3_R)
    extrude(amount=-CUT_EXTRUDE2_DEPTH, mode=Mode.SUBTRACT)

    # Sketch4 → Revolve3 (revolve)
    with BuildSketch(Plane(origin=(0, 0, 0), x_dir=(0, 0, -1), z_dir=(1, 0, 0)), mode=Mode.PRIVATE) as revolve3_sk:
        Polygon((0, -7.532770955), (0.125193645, -8), (0.511563976, -7.896472382), (0.4, -7.480109956), (0.4, -2.498650108), (0, -2.498650108), align=None)
    revolve(revolve3_sk.sketch.rotate(Axis((0, 0, 0), (0, 0, -1)), 270), axis=Axis((0, 0, 0), (0, 0, -1)))

    # Sketch7 → Revolve4 (revolve)
    with BuildSketch(Plane(origin=(0, 0, 0), x_dir=(0, 0, -1), z_dir=(1, 0, 0)), mode=Mode.PRIVATE) as revolve4_sk:
        Polygon((-7, 3.370594433), (-7, 7.532770955), (-7.125193645, 8), (-15.235193645, 8), (-15.485193645, 7.75), (-15.485193645, 3.370594433), align=None)
    revolve(revolve4_sk.sketch.rotate(Axis((0, -0.003090187, 7), (0, 0, 1)), 90), axis=Axis((0, -0.003090187, 7), (0, 0, 1)))


solid = part.part
